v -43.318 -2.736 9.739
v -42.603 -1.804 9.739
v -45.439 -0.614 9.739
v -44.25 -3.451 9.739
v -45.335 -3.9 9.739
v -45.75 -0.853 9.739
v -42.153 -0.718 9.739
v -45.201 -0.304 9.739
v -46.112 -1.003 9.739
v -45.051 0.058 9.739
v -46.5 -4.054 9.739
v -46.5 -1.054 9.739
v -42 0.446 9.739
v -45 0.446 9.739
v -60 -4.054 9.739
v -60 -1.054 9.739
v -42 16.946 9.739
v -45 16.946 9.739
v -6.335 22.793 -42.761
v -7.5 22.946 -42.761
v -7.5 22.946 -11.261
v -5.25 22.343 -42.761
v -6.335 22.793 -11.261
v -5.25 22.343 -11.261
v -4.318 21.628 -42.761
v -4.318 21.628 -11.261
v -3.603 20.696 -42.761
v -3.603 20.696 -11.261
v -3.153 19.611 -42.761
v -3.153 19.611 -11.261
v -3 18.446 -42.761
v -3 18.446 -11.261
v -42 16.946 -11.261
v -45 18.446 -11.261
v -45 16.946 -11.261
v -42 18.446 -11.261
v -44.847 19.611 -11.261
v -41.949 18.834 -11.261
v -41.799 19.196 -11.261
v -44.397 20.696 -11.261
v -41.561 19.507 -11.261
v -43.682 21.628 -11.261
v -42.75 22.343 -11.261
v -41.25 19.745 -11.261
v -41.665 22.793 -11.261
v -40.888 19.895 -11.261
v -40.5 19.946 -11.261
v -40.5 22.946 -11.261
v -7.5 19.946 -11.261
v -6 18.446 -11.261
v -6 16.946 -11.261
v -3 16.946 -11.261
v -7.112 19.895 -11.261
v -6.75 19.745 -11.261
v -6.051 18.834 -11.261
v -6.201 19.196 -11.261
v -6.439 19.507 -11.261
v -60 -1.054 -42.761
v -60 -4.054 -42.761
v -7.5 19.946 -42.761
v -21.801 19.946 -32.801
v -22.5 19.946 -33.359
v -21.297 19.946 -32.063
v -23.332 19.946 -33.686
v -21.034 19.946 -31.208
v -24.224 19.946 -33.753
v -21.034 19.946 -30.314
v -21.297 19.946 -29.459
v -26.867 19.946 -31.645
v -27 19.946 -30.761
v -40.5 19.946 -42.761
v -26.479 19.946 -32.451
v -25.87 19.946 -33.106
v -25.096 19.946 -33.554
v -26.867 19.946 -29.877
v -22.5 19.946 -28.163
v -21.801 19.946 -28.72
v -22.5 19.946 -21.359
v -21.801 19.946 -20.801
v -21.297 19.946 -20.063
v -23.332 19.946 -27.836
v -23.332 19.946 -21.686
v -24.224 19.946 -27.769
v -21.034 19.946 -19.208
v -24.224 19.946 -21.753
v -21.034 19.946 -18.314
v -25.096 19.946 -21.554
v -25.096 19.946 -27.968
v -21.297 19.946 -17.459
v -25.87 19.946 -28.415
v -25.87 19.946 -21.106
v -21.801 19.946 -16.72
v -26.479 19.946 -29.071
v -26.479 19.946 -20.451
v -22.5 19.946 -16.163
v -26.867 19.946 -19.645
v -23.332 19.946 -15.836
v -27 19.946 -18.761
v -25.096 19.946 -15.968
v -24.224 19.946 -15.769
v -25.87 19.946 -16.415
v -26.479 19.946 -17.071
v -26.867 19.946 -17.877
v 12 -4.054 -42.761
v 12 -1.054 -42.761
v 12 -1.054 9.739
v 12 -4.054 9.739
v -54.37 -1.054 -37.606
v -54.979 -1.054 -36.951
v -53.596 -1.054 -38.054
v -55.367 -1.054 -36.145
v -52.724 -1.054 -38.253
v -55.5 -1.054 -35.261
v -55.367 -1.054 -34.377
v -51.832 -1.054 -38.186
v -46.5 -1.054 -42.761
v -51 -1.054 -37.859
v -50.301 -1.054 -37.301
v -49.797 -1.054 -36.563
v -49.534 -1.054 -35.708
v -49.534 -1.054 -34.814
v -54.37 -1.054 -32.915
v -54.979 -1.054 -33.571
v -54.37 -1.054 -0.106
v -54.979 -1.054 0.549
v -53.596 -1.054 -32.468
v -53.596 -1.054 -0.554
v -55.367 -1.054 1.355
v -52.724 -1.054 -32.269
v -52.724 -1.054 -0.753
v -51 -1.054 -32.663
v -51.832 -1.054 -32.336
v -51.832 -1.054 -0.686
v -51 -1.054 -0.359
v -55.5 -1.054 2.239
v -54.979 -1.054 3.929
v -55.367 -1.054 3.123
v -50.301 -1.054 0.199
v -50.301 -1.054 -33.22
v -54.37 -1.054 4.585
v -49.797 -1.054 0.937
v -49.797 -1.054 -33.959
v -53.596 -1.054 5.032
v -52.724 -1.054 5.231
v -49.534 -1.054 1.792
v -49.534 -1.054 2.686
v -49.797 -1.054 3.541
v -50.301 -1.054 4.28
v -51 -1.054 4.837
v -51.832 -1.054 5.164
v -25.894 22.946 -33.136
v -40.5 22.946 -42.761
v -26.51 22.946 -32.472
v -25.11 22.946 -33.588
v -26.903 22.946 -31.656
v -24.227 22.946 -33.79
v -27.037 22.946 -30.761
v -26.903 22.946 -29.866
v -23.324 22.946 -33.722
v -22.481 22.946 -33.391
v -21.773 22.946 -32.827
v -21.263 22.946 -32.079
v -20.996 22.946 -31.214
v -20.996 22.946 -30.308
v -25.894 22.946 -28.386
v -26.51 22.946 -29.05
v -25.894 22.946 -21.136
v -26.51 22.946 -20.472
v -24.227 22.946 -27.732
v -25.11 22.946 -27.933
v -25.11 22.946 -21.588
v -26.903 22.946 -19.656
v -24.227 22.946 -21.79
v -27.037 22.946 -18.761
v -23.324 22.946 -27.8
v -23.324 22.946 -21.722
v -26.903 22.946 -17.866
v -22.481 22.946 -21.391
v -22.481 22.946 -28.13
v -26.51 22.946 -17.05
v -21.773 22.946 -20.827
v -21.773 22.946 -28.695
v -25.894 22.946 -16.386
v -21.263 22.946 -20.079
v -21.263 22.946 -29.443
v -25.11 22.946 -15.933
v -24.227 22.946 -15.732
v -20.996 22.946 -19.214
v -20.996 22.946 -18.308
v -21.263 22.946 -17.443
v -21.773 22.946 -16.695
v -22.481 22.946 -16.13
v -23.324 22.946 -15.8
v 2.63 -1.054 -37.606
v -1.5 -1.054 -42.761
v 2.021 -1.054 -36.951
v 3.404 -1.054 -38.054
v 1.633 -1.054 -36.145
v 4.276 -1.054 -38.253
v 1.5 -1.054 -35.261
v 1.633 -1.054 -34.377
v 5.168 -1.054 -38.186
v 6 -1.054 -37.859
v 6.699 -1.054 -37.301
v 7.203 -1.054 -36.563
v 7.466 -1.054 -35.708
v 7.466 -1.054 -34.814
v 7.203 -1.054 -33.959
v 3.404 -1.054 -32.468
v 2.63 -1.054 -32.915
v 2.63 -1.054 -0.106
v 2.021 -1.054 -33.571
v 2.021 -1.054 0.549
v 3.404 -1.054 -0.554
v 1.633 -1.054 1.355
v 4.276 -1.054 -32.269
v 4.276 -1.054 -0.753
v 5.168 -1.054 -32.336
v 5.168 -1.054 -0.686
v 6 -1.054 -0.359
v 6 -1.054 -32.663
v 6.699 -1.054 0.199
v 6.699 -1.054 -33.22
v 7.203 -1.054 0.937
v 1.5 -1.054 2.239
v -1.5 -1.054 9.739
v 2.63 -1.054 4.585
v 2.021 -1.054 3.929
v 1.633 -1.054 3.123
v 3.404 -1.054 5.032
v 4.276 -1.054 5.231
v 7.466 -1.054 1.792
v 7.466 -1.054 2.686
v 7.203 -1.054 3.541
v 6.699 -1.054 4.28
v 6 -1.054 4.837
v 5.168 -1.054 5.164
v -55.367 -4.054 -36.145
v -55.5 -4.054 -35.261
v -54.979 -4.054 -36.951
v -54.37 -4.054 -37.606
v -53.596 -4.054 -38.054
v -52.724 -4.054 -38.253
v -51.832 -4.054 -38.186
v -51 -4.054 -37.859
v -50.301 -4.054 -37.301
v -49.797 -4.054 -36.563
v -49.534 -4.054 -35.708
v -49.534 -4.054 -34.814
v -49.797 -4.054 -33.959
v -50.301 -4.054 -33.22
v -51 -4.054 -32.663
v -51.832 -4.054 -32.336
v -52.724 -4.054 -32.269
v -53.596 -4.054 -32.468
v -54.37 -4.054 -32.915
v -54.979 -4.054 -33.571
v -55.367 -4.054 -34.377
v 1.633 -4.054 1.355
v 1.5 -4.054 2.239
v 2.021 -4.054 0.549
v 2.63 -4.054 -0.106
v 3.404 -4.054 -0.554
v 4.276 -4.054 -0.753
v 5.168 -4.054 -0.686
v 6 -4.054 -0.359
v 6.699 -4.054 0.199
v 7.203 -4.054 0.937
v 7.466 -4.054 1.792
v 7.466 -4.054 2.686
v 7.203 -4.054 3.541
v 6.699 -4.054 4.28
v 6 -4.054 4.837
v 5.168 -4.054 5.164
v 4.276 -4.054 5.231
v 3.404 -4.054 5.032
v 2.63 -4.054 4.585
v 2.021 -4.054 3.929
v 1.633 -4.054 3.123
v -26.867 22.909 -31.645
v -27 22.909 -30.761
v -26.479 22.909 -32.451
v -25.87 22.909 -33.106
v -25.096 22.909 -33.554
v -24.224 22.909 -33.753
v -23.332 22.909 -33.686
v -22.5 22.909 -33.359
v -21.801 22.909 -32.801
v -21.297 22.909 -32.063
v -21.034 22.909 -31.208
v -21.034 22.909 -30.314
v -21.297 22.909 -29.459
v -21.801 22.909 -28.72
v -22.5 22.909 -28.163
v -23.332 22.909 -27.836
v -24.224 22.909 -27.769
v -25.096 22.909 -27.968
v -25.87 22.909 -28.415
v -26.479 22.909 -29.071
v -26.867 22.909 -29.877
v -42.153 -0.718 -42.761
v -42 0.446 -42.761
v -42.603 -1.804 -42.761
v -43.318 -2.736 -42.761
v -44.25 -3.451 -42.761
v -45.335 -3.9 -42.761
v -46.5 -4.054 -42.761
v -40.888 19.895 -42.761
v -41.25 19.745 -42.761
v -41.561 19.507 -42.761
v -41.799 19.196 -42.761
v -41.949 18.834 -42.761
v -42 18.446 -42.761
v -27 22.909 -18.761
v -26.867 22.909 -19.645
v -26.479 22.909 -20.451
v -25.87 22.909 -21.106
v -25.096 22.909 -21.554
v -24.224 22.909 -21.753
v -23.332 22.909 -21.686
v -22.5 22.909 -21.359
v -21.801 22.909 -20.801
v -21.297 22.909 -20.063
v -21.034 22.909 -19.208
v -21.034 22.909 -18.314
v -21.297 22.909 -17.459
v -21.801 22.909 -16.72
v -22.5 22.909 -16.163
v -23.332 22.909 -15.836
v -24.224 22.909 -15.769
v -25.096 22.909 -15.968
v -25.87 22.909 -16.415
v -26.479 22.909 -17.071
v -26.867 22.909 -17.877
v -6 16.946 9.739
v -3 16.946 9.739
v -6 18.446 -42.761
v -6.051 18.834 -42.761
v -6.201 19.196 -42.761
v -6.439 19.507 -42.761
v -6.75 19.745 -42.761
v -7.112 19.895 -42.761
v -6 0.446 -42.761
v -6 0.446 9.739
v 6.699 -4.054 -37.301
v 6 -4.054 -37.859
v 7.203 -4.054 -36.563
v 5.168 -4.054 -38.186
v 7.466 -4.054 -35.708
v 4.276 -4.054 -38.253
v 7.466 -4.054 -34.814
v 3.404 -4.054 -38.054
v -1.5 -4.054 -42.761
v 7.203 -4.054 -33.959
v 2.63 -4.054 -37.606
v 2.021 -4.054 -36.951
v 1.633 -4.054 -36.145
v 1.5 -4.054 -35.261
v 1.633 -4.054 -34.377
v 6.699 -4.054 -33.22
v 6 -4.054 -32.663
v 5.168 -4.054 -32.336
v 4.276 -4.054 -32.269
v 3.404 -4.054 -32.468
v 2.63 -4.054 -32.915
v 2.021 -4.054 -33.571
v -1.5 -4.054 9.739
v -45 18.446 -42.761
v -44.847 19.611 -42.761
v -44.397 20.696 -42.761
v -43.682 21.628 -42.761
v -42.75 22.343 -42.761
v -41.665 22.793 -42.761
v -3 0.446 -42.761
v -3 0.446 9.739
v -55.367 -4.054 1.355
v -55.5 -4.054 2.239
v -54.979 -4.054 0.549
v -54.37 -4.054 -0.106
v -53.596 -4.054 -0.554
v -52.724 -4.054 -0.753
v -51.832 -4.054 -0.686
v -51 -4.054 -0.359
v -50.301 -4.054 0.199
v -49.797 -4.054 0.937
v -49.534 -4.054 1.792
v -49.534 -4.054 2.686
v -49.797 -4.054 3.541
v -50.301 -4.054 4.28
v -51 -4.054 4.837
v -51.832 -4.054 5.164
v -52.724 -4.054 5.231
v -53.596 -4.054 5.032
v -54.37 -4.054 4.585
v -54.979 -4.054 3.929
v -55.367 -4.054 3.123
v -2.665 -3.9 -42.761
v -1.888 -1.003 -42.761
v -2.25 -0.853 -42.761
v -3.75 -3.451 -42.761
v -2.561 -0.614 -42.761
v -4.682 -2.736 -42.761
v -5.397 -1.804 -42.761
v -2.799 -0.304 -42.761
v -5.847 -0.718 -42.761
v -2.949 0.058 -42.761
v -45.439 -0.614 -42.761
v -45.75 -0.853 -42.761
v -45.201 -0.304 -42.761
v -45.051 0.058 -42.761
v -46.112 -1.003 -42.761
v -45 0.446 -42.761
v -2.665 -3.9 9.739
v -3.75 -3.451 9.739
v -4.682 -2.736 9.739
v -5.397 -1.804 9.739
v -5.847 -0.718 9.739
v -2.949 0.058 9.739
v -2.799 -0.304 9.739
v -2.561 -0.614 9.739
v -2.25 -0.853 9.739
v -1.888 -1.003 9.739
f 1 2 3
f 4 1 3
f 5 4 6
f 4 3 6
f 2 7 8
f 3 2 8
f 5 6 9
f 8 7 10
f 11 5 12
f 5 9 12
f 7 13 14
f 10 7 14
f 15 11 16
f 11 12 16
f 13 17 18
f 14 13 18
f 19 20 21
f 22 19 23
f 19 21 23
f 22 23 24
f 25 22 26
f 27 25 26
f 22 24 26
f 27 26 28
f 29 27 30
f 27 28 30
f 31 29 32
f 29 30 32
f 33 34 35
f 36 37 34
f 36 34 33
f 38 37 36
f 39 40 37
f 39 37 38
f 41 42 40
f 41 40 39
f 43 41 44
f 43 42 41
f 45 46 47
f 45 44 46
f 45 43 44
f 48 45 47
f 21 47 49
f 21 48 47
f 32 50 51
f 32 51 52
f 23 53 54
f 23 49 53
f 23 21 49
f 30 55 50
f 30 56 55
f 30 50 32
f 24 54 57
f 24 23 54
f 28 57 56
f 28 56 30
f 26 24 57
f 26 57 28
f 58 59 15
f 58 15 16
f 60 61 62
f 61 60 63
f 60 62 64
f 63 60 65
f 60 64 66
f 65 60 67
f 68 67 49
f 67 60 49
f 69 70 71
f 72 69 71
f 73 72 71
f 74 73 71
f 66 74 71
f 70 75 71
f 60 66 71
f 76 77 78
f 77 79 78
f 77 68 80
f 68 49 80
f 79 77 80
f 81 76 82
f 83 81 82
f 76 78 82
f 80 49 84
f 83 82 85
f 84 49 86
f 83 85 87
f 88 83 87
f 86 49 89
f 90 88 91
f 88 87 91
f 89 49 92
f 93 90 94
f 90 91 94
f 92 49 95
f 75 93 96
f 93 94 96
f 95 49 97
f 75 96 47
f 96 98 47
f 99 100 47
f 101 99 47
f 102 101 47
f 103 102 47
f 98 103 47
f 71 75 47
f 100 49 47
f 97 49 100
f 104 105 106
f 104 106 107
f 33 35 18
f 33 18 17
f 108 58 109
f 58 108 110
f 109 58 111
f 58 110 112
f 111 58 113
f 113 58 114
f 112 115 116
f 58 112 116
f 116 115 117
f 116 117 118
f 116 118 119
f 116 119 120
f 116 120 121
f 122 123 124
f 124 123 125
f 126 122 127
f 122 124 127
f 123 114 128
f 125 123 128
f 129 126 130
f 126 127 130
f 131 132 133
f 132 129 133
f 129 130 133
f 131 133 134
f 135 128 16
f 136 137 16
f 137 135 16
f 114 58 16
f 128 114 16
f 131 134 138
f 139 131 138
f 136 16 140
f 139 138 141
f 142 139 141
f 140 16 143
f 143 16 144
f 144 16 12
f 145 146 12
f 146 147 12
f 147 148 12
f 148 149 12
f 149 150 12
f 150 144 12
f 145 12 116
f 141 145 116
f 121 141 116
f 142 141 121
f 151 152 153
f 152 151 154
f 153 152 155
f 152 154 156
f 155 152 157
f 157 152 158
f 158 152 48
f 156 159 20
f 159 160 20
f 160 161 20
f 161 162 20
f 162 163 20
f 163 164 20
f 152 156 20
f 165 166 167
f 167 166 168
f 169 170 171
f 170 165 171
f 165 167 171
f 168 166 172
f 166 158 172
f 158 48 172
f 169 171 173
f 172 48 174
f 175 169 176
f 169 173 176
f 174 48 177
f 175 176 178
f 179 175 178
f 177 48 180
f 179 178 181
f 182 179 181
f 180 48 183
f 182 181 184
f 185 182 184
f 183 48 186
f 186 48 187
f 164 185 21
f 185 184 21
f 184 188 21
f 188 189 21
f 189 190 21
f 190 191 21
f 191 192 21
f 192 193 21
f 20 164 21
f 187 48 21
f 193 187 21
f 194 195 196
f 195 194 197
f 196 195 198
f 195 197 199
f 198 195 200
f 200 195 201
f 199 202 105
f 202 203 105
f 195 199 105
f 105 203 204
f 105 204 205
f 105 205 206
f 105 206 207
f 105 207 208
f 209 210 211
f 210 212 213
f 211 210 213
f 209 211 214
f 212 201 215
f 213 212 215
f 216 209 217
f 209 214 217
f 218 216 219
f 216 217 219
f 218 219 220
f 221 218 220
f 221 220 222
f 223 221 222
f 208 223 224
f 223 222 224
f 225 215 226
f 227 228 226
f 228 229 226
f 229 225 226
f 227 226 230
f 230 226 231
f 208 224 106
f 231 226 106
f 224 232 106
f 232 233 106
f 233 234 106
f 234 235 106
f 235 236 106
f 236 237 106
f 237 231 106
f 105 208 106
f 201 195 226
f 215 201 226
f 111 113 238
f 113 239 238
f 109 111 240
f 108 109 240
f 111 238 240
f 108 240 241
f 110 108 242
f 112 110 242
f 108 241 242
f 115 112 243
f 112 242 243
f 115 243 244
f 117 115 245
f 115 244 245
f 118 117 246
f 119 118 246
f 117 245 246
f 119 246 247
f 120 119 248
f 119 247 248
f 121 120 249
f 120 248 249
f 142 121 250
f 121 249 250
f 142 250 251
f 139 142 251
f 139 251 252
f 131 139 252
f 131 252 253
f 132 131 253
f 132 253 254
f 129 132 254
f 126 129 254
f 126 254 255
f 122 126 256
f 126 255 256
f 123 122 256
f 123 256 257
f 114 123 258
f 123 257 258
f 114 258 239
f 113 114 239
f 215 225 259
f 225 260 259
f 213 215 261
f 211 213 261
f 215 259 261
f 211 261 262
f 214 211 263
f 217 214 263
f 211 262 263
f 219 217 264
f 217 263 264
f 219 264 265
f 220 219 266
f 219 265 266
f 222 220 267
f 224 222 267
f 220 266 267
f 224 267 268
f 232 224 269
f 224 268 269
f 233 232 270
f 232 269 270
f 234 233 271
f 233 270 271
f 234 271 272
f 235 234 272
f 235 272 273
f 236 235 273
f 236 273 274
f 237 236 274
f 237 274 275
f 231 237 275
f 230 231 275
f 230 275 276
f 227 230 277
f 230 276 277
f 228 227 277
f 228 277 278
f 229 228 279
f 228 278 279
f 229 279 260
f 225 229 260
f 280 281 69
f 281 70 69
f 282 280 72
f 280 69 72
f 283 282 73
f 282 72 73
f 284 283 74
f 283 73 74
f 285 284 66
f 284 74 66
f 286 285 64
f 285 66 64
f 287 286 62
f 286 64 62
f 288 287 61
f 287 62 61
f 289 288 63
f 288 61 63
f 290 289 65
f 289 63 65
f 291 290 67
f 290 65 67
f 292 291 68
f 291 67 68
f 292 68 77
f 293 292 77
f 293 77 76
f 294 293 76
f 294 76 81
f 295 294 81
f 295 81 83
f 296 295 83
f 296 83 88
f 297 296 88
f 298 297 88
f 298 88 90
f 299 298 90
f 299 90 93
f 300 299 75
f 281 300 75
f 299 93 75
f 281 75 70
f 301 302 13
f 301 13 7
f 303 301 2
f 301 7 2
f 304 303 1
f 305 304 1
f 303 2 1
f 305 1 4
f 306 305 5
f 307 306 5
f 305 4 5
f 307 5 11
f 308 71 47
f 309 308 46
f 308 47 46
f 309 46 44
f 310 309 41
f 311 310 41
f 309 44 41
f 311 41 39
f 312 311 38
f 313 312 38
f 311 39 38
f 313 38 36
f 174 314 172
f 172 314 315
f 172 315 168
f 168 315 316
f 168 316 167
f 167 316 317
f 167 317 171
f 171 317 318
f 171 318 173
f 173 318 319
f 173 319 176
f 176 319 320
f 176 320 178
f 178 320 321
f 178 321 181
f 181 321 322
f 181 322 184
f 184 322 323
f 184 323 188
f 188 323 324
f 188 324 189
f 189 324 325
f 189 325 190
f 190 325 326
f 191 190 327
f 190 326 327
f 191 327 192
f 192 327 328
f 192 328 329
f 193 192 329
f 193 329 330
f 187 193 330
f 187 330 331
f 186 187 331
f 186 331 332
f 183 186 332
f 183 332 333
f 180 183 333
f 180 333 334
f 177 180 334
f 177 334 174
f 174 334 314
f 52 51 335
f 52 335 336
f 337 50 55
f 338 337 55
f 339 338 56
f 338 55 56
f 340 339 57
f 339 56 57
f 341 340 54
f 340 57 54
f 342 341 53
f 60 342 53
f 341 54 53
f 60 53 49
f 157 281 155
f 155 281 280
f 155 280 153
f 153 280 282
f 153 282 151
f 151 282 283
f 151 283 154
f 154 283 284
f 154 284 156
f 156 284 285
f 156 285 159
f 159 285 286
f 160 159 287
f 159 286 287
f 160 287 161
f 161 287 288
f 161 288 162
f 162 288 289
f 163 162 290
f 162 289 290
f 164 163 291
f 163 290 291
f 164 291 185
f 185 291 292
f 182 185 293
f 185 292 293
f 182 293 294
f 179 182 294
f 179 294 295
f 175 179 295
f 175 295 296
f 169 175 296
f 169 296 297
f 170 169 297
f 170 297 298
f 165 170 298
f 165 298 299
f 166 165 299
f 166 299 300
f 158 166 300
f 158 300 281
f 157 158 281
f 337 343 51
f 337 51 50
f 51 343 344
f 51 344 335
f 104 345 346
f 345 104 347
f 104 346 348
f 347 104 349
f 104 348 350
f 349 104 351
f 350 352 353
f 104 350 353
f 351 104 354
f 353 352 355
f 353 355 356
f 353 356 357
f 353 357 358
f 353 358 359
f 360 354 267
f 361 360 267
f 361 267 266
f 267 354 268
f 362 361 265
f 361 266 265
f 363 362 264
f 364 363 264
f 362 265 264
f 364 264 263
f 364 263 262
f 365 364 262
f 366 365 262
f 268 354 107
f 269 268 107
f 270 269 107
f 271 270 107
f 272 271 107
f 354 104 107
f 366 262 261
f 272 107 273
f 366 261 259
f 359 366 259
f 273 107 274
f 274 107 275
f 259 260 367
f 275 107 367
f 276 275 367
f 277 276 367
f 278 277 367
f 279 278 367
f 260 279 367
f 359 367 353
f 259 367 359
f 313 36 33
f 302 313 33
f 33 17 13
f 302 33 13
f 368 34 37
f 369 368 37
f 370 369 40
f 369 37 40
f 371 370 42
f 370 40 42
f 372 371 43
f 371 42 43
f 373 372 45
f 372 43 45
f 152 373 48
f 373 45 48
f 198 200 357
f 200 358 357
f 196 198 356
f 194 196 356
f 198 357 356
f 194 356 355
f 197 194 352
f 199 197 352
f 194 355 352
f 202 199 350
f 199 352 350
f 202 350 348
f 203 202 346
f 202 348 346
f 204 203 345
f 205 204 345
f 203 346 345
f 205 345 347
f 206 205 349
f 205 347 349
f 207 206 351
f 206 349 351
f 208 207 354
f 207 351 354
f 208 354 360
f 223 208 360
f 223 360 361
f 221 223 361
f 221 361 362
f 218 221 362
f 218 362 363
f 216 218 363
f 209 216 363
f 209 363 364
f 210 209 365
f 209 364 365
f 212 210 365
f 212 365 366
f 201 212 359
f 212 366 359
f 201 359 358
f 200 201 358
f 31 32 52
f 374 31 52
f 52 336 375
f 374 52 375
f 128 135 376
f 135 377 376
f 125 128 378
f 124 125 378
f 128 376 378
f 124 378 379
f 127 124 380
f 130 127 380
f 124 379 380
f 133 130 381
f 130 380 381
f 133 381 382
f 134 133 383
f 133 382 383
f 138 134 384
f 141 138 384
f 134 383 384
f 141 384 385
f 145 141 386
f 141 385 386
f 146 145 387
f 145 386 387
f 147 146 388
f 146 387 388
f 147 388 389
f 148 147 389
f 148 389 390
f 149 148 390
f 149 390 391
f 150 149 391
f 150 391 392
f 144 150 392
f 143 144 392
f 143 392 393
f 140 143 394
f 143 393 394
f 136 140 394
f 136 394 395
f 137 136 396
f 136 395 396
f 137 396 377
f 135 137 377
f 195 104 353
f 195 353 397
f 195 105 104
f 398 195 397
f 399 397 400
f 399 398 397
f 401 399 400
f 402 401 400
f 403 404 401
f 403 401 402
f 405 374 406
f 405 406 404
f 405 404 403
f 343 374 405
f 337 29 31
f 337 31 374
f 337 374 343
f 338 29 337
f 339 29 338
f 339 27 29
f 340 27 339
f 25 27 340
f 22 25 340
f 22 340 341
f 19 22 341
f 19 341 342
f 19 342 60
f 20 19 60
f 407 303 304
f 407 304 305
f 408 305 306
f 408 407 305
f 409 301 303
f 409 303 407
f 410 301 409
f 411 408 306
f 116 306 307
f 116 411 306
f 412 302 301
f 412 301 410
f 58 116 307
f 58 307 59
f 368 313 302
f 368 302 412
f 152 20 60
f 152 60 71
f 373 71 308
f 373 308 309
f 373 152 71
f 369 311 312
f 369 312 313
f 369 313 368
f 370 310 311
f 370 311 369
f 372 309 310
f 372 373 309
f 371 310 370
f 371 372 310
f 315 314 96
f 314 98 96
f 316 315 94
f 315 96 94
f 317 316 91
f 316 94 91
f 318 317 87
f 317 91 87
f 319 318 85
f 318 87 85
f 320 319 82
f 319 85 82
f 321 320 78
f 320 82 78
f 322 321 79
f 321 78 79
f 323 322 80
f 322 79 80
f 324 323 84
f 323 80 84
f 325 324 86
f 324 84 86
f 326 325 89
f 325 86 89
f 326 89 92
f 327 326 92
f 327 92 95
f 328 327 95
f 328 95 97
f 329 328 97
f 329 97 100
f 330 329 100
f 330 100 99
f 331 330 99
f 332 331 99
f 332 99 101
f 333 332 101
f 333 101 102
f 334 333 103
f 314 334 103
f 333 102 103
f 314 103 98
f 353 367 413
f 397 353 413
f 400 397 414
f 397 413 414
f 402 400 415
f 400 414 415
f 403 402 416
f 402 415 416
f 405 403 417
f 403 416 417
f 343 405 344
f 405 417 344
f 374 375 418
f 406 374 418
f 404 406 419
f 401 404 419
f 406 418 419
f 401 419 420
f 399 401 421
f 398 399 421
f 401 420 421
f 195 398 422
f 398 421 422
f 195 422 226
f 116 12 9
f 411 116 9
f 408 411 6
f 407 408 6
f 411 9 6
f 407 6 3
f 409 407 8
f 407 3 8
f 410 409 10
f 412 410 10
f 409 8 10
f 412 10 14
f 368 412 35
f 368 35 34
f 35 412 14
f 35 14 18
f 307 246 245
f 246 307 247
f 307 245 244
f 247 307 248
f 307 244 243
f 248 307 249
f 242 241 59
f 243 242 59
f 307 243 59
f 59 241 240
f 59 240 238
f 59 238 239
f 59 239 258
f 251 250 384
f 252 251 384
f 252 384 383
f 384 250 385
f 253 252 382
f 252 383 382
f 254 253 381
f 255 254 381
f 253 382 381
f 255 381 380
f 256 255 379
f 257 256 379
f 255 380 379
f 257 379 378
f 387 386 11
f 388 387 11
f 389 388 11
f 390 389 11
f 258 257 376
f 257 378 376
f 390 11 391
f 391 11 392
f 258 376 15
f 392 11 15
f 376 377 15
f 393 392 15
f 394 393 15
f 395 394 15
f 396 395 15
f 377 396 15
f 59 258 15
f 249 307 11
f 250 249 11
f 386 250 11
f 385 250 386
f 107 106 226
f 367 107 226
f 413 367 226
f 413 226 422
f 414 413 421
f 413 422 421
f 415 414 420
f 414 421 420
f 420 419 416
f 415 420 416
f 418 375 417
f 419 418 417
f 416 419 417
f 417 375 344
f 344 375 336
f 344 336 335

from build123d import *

# Parameters (mm, degrees)
BASE_FLANGE1_DEPTH                 = 35
SKETCH10_W                         = 28
SKETCH10_H                         = 14
CUT_EXTRUDE1_DEPTH                 = 4
F_4_0_4_DIAMETER_HOLE1_D           = 4
F_4_0_4_DIAMETER_HOLE1_CSINK_D     = 4.05
F_4_0_4_DIAMETER_HOLE1_CSINK_ANGLE = 90
SCALE1_SCALE                       = 1.5


# Sheet-metal steps are written as plain solids
with BuildPart() as part:
    # Sketch1 → Base-Flange1 (new body)
    with BuildSketch(Plane.XY):
        with BuildLine():
            Line((0, 0), (-9, 0))
            ThreePointArc((-9, 0), (-11.121320344, 0.878679656), (-12, 3))
            Line((-12, 3), (-12, 15))
            ThreePointArc((-12, 15), (-12.292893219, 15.707106781), (-13, 16))
            Line((-13, 16), (-35, 16))
            ThreePointArc((-35, 16), (-35.707106781, 15.707106781), (-36, 15))
            Line((-36, 15), (-36, 3))
            ThreePointArc((-36, 3), (-36.878679656, 0.878679656), (-39, 0))
            Line((-39, 0), (-48, 0))
            Line((-48, 0), (-48, 2))
            Line((-48, 2), (-39, 2))
            ThreePointArc((-39, 2), (-38.292893219, 2.292893219), (-38, 3))
            Line((-38, 3), (-38, 15))
            ThreePointArc((-38, 15), (-37.121320344, 17.121320344), (-35, 18))
            Line((-35, 18), (-13, 18))
            ThreePointArc((-13, 18), (-10.878679656, 17.121320344), (-10, 15))
            Line((-10, 15), (-10, 3))
            ThreePointArc((-10, 3), (-9.707106781, 2.292893219), (-9, 2))
            Line((-9, 2), (0, 2))
            Line((0, 2), (0, 0))
        make_face()
    extrude(amount=-BASE_FLANGE1_DEPTH)

    # Sketch10 → Cut-Extrude1 (cut)
    with BuildSketch(Plane(origin=(0, 18, 0), x_dir=(1, 0, 0), z_dir=(0, 1, 0))):
        with Locations((-24, 7)):
            Rectangle(SKETCH10_W, SKETCH10_H)
    extrude(amount=-CUT_EXTRUDE1_DEPTH, mode=Mode.SUBTRACT)

    # Ø4.0 (4) Diameter Hole1 (through all)
    with Locations(Plane(origin=(0, 18, 0), x_dir=(1, 0, 0), z_dir=(0, 1, 0))):
        with Locations((-24, 27), (-24, 19), (-43, 30), (-43, 5), (-5, 30), (-5, 5)):
            CounterSinkHole(F_4_0_4_DIAMETER_HOLE1_D / 2, F_4_0_4_DIAMETER_HOLE1_CSINK_D / 2, counter_sink_angle=F_4_0_4_DIAMETER_HOLE1_CSINK_ANGLE)


with BuildPart() as part_1:
    # Scale1: scaled about (-24, 8.107482912, -19.478199083)
    add(part.part.scale(SCALE1_SCALE).moved(Location((12, -4.053741456, 9.739099541))))


solid = part_1.part
